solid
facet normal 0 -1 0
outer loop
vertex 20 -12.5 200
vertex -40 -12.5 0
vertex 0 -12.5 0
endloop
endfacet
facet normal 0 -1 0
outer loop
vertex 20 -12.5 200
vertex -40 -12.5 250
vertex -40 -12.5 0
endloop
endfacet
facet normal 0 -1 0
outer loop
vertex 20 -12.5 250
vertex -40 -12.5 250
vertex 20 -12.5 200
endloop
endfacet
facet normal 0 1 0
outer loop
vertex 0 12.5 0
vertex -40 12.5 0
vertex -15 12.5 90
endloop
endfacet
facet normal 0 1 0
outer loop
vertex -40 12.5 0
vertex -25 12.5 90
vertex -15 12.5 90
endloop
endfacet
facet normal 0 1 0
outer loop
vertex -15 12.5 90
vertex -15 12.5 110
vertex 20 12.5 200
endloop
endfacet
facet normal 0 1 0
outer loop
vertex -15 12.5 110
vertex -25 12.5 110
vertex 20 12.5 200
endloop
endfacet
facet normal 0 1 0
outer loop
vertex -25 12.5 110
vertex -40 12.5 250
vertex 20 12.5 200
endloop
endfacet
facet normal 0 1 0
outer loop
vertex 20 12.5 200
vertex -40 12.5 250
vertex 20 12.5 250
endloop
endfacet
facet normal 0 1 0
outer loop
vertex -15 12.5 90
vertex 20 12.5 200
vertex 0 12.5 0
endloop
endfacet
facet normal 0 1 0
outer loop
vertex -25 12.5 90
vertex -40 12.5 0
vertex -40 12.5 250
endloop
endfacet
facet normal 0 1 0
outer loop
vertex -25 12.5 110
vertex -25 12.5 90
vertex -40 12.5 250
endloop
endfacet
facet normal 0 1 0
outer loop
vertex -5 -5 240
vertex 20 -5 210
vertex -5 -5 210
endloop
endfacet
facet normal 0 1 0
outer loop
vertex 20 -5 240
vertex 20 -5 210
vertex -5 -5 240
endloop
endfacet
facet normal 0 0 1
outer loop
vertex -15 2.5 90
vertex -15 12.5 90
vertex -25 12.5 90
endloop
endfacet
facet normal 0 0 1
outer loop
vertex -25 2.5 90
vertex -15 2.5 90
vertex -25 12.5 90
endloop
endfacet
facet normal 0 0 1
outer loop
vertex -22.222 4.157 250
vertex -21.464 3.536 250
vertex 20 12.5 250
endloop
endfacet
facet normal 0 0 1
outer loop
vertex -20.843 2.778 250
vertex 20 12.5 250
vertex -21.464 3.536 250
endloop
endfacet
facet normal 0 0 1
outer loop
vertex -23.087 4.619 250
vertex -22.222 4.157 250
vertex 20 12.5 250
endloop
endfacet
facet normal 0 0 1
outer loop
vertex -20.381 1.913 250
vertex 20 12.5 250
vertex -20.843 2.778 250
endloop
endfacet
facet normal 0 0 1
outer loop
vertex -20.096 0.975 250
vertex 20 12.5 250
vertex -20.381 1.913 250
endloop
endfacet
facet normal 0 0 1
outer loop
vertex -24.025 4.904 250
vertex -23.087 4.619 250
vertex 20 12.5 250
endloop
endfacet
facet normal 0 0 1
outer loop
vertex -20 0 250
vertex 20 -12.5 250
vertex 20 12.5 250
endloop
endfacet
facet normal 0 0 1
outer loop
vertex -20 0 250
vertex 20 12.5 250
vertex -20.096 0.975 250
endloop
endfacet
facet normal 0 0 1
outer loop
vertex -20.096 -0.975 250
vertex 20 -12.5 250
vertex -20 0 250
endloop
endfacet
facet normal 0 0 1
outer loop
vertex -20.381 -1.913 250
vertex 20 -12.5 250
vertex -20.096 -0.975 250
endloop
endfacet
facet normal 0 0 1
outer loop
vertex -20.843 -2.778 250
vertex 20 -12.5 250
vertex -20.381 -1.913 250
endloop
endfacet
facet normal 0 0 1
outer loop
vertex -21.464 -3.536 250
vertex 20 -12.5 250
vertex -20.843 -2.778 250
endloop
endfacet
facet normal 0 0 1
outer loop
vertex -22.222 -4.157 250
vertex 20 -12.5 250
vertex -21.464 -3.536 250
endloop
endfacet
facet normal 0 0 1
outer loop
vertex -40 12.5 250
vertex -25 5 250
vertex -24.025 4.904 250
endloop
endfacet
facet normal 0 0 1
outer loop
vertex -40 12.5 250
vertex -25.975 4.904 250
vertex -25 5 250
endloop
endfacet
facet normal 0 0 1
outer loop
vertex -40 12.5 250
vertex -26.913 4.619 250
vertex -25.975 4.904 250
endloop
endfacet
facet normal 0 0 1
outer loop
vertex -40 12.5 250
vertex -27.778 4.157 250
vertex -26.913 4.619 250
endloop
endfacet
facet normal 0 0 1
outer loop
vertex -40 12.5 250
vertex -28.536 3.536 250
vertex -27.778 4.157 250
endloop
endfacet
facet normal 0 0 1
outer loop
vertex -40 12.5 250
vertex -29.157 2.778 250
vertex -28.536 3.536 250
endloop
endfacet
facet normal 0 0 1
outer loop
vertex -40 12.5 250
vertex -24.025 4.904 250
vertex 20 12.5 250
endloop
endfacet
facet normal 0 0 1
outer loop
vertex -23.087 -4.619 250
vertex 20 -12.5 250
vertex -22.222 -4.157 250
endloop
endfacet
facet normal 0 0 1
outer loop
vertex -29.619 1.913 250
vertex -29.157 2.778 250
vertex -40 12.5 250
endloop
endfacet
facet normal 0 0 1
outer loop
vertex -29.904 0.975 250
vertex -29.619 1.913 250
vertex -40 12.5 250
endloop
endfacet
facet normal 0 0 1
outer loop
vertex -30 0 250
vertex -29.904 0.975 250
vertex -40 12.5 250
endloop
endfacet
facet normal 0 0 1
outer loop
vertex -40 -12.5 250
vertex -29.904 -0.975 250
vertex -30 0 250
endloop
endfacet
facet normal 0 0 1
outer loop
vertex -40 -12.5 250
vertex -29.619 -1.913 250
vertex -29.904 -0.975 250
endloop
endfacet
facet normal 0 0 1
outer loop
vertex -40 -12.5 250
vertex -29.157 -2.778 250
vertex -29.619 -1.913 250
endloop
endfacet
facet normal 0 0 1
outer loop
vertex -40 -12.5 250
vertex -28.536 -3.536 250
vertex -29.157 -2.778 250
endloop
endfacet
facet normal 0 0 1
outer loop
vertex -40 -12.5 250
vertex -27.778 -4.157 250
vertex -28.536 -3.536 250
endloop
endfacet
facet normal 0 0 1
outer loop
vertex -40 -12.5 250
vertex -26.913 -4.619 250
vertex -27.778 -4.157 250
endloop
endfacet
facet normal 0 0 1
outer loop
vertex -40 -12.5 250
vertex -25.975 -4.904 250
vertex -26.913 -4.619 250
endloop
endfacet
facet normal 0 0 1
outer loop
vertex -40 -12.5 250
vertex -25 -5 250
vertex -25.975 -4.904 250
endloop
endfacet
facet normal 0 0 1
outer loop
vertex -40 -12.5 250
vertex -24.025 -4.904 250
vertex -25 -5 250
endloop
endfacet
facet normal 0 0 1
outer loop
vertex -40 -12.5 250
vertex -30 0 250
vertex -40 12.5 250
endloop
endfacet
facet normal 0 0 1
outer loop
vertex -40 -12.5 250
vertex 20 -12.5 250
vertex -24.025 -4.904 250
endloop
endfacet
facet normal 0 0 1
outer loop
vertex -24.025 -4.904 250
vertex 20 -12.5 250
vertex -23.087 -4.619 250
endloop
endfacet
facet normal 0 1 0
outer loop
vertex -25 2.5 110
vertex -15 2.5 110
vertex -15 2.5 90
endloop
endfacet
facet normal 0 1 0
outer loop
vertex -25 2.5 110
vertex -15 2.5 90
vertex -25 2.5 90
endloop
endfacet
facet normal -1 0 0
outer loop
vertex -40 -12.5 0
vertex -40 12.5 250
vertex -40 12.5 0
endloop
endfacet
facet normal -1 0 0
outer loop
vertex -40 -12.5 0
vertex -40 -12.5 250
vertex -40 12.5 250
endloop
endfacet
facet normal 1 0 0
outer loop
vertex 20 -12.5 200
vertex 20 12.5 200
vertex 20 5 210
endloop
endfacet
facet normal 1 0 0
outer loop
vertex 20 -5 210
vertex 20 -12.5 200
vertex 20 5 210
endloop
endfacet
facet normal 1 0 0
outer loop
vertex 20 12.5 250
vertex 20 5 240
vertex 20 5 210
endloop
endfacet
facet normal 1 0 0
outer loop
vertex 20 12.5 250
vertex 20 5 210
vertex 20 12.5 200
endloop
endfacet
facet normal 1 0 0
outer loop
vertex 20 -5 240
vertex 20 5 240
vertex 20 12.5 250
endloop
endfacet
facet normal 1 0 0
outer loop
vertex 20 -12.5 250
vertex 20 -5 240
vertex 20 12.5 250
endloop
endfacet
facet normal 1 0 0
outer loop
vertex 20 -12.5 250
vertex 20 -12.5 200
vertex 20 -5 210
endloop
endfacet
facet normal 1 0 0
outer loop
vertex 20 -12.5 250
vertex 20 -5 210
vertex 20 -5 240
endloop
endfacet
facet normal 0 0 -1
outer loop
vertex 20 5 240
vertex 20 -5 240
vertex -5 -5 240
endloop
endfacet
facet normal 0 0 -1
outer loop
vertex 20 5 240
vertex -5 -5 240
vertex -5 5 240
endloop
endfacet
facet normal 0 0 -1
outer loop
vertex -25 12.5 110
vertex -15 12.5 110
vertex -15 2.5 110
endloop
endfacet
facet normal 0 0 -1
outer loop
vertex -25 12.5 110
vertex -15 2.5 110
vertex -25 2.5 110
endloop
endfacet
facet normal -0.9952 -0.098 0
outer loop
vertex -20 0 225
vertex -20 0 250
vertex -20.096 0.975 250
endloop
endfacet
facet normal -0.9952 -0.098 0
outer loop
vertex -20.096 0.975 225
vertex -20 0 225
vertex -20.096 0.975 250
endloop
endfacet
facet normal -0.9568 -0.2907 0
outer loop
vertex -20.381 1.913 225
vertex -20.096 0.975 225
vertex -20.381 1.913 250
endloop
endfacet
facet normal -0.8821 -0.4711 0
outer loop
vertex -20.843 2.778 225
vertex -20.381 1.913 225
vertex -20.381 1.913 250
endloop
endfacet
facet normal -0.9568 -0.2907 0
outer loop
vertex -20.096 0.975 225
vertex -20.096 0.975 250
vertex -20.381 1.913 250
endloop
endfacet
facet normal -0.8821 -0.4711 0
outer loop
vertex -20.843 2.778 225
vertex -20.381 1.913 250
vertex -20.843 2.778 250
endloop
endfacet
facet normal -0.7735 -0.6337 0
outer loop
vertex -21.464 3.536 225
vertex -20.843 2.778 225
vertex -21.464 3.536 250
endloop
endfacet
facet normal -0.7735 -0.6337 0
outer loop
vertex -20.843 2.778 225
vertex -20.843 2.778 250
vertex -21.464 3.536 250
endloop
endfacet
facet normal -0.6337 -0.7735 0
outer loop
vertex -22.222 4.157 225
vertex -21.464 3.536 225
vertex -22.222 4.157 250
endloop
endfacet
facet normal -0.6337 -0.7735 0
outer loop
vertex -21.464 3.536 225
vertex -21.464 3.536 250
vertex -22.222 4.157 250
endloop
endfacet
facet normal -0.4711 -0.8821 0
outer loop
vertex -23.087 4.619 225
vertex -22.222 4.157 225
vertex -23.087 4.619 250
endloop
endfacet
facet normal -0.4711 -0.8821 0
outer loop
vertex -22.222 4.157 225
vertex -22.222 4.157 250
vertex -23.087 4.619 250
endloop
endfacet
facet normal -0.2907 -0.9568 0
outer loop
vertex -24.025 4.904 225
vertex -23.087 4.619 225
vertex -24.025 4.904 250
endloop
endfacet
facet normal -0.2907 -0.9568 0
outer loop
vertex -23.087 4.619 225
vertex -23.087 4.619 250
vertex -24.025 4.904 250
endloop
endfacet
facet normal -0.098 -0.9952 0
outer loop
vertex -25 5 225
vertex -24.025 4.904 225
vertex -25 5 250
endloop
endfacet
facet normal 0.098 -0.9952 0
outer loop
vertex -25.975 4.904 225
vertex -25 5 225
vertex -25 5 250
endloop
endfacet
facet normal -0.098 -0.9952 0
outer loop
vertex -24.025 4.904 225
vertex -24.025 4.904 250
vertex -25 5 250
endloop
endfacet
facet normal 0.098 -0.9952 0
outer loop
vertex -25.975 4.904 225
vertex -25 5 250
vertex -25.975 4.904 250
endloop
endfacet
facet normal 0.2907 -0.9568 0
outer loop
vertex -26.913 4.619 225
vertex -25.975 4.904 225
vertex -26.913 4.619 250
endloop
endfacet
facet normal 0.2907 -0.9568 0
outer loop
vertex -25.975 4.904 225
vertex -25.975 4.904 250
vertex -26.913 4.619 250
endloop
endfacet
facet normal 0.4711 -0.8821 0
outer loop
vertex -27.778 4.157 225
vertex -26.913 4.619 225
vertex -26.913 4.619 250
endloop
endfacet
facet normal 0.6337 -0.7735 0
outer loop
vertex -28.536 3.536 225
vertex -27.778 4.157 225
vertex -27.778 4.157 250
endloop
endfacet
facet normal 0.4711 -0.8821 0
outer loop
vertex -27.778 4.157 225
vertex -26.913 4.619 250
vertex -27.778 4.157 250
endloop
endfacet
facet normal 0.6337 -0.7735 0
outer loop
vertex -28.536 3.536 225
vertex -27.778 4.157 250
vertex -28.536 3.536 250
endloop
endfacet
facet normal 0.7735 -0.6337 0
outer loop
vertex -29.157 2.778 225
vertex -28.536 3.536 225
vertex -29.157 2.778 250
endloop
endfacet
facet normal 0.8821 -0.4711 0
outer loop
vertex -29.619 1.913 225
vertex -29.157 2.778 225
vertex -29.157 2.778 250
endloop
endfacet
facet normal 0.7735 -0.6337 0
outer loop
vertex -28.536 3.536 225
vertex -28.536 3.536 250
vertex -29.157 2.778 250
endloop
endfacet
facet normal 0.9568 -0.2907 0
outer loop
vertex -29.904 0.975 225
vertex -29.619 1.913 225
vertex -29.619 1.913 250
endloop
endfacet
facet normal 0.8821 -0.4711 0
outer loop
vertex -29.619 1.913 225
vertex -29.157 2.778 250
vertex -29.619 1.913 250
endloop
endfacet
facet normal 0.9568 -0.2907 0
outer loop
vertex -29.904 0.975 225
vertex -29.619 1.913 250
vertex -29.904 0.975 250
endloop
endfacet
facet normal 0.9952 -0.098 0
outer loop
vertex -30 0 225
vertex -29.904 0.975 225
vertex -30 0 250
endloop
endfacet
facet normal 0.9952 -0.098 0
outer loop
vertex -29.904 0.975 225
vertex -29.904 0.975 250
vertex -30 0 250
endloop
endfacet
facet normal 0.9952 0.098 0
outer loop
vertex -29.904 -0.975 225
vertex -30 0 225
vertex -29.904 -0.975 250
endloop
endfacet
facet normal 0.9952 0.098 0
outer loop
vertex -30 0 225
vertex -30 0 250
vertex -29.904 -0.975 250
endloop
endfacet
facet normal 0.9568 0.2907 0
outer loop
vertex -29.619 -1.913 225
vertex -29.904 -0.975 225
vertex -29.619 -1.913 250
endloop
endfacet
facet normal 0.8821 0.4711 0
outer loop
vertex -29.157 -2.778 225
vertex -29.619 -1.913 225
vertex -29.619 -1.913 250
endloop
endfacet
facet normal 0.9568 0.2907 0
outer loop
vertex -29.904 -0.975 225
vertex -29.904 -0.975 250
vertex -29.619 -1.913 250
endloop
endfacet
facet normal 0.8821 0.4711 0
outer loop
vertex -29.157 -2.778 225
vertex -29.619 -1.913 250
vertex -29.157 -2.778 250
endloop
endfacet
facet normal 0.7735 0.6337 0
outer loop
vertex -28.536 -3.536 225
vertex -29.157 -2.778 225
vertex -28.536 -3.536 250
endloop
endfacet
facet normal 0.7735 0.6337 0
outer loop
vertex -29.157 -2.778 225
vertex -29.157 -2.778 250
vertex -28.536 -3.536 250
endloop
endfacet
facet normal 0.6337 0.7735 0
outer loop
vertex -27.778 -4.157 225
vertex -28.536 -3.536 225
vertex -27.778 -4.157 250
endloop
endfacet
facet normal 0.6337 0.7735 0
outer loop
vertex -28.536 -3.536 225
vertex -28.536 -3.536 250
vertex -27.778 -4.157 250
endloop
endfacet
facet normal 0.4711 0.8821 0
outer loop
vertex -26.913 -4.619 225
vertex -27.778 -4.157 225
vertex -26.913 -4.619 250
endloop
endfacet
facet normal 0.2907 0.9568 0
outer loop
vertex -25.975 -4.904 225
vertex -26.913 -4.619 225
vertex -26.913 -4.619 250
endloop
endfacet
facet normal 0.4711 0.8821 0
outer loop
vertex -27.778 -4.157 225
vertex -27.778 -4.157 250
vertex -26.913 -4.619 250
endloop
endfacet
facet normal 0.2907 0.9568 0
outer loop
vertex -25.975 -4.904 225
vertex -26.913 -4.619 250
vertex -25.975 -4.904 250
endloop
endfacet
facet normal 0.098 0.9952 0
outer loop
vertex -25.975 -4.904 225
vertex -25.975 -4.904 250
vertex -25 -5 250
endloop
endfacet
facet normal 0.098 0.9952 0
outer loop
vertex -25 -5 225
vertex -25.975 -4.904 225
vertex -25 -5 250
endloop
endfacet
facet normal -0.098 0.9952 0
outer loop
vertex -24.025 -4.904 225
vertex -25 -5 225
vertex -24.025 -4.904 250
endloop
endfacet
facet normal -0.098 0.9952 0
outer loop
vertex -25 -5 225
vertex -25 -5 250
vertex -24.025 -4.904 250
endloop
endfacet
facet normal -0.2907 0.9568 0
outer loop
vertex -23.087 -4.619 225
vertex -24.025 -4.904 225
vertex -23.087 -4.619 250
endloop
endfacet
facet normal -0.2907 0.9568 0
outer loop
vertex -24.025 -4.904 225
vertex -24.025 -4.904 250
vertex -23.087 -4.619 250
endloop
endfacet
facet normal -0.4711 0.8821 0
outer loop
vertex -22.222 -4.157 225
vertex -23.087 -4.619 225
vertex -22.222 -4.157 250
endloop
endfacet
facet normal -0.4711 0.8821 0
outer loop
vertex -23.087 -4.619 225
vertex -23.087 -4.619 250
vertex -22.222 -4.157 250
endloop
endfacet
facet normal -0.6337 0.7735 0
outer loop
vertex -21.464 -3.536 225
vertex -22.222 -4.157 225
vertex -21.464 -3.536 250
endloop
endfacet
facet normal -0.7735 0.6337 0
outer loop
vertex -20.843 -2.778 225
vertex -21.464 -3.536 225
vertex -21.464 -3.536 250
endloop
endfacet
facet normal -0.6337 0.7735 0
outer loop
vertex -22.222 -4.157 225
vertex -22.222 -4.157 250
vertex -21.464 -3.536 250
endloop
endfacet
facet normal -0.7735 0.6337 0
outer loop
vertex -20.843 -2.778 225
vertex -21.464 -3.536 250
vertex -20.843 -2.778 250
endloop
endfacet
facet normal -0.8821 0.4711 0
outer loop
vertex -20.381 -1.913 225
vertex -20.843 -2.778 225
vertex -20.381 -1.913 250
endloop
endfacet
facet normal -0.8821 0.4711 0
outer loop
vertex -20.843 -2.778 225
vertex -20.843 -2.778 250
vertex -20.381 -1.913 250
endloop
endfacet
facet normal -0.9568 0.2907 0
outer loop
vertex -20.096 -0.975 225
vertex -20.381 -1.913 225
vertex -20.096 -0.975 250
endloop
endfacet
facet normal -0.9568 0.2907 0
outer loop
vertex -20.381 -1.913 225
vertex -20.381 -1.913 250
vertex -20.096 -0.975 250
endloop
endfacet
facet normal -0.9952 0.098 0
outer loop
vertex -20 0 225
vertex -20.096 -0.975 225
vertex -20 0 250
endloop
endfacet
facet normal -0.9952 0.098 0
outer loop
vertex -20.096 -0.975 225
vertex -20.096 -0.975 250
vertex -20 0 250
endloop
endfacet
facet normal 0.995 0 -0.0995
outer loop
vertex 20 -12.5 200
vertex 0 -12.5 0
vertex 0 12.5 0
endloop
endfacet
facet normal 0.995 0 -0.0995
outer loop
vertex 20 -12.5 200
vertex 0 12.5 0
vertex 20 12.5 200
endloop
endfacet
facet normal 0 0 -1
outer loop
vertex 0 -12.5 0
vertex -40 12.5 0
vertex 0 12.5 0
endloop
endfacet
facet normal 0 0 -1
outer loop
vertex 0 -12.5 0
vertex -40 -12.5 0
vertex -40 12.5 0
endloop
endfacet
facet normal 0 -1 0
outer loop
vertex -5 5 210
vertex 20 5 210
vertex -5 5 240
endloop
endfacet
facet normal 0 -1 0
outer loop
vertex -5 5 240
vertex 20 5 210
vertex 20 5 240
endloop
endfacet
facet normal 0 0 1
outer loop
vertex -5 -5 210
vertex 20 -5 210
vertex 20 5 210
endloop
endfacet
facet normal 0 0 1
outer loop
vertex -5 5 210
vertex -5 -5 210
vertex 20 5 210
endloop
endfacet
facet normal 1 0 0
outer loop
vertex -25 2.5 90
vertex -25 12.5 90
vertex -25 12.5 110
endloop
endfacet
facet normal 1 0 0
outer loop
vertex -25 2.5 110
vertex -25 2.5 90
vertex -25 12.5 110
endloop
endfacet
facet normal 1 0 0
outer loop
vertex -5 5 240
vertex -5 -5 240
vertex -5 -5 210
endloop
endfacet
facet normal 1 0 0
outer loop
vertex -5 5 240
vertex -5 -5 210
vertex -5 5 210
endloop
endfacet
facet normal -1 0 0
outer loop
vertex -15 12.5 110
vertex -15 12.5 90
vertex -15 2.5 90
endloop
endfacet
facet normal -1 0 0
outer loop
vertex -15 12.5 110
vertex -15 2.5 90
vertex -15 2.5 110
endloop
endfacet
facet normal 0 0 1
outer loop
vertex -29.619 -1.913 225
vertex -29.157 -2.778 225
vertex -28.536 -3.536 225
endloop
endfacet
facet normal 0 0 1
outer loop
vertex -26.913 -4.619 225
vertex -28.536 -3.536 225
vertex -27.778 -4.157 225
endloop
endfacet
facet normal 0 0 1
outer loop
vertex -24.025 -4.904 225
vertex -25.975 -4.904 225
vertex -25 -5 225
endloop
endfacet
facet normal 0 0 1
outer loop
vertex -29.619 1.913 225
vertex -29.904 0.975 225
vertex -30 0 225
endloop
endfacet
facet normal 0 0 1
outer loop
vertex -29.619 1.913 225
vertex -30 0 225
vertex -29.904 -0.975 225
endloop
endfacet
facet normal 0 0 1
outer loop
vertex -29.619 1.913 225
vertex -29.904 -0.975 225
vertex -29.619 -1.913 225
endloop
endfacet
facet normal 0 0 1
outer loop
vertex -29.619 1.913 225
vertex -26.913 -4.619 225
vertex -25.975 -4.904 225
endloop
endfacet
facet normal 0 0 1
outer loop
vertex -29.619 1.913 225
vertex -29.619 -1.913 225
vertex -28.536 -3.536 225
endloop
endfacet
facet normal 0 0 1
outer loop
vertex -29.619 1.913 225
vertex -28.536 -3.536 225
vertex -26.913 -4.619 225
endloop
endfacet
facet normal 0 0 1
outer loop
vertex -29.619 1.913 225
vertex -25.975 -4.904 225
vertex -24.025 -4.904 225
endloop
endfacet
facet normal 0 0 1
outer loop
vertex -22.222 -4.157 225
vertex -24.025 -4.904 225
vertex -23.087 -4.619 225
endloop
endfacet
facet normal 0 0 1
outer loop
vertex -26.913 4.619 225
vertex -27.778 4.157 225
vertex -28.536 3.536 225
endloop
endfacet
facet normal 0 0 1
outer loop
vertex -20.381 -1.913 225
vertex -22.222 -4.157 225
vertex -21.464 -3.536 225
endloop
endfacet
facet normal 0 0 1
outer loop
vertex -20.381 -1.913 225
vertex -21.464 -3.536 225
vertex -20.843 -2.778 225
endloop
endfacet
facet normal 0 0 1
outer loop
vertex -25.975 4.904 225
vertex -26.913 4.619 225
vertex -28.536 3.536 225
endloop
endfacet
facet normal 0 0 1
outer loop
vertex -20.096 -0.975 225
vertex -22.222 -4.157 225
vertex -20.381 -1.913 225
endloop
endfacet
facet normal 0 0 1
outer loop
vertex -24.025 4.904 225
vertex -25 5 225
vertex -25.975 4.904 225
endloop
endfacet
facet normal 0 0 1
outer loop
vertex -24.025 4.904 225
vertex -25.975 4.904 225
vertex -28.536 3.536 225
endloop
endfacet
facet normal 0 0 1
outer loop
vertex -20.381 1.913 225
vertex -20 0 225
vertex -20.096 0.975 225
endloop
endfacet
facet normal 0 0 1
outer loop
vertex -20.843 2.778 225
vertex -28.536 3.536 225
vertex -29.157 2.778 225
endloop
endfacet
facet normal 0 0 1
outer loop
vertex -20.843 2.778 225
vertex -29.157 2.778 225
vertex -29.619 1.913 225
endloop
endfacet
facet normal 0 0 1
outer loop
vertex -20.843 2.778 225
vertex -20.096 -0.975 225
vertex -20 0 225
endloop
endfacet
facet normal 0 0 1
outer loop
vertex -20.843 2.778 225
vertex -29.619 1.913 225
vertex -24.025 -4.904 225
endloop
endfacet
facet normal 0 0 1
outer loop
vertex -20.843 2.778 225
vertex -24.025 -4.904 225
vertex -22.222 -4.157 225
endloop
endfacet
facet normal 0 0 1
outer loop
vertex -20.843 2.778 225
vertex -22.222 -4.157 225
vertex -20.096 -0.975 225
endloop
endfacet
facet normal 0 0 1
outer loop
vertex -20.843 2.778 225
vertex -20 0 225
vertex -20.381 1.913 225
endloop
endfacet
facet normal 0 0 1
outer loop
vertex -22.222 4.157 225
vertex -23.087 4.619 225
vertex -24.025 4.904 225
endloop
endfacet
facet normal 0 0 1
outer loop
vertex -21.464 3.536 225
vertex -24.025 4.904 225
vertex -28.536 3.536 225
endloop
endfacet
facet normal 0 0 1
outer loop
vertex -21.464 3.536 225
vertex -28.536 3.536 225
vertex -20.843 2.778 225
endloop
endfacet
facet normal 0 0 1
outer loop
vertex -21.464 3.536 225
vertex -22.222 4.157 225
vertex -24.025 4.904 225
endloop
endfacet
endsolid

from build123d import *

# Parameters (mm, degrees)
F1_DEPTH = 12.5
F2_W     = 10
F2_H     = 30
F3_DEPTH = 25
F4_W     = 10
F4_H     = 20
F5_DEPTH = 10
F6_R     = 5
F7_DEPTH = 25


with BuildPart() as f1:
    # F0 (on Front) → F1 (new body, symmetric)
    with BuildSketch(Plane.XZ):
        Polygon((-40, 0), (0, 0), (20, 200), (20, 250), (-40, 250), align=None)
    extrude(amount=F1_DEPTH, both=True)

    # F2 (on face) → F3 (cut)
    with BuildSketch(Plane.YZ.offset(20)):
        with Locations((0, 225)):
            Rectangle(F2_W, F2_H)
    extrude(amount=-F3_DEPTH, mode=Mode.SUBTRACT)

    # F4 (on face) → F5 (cut)
    with BuildSketch(Plane(origin=(0, 12.5, 0), x_dir=(-1, 0, 0), z_dir=(0, 1, 0))):
        with Locations((20, 100)):
            Rectangle(F4_W, F4_H)
    extrude(amount=-F5_DEPTH, mode=Mode.SUBTRACT)

    # F6 (on face) → F7 (cut)
    with BuildSketch(Plane.XY.offset(250)):
        with Locations((-25, 0)):
            Circle(F6_R)
    extrude(amount=-F7_DEPTH, mode=Mode.SUBTRACT)


solid = f1.part
